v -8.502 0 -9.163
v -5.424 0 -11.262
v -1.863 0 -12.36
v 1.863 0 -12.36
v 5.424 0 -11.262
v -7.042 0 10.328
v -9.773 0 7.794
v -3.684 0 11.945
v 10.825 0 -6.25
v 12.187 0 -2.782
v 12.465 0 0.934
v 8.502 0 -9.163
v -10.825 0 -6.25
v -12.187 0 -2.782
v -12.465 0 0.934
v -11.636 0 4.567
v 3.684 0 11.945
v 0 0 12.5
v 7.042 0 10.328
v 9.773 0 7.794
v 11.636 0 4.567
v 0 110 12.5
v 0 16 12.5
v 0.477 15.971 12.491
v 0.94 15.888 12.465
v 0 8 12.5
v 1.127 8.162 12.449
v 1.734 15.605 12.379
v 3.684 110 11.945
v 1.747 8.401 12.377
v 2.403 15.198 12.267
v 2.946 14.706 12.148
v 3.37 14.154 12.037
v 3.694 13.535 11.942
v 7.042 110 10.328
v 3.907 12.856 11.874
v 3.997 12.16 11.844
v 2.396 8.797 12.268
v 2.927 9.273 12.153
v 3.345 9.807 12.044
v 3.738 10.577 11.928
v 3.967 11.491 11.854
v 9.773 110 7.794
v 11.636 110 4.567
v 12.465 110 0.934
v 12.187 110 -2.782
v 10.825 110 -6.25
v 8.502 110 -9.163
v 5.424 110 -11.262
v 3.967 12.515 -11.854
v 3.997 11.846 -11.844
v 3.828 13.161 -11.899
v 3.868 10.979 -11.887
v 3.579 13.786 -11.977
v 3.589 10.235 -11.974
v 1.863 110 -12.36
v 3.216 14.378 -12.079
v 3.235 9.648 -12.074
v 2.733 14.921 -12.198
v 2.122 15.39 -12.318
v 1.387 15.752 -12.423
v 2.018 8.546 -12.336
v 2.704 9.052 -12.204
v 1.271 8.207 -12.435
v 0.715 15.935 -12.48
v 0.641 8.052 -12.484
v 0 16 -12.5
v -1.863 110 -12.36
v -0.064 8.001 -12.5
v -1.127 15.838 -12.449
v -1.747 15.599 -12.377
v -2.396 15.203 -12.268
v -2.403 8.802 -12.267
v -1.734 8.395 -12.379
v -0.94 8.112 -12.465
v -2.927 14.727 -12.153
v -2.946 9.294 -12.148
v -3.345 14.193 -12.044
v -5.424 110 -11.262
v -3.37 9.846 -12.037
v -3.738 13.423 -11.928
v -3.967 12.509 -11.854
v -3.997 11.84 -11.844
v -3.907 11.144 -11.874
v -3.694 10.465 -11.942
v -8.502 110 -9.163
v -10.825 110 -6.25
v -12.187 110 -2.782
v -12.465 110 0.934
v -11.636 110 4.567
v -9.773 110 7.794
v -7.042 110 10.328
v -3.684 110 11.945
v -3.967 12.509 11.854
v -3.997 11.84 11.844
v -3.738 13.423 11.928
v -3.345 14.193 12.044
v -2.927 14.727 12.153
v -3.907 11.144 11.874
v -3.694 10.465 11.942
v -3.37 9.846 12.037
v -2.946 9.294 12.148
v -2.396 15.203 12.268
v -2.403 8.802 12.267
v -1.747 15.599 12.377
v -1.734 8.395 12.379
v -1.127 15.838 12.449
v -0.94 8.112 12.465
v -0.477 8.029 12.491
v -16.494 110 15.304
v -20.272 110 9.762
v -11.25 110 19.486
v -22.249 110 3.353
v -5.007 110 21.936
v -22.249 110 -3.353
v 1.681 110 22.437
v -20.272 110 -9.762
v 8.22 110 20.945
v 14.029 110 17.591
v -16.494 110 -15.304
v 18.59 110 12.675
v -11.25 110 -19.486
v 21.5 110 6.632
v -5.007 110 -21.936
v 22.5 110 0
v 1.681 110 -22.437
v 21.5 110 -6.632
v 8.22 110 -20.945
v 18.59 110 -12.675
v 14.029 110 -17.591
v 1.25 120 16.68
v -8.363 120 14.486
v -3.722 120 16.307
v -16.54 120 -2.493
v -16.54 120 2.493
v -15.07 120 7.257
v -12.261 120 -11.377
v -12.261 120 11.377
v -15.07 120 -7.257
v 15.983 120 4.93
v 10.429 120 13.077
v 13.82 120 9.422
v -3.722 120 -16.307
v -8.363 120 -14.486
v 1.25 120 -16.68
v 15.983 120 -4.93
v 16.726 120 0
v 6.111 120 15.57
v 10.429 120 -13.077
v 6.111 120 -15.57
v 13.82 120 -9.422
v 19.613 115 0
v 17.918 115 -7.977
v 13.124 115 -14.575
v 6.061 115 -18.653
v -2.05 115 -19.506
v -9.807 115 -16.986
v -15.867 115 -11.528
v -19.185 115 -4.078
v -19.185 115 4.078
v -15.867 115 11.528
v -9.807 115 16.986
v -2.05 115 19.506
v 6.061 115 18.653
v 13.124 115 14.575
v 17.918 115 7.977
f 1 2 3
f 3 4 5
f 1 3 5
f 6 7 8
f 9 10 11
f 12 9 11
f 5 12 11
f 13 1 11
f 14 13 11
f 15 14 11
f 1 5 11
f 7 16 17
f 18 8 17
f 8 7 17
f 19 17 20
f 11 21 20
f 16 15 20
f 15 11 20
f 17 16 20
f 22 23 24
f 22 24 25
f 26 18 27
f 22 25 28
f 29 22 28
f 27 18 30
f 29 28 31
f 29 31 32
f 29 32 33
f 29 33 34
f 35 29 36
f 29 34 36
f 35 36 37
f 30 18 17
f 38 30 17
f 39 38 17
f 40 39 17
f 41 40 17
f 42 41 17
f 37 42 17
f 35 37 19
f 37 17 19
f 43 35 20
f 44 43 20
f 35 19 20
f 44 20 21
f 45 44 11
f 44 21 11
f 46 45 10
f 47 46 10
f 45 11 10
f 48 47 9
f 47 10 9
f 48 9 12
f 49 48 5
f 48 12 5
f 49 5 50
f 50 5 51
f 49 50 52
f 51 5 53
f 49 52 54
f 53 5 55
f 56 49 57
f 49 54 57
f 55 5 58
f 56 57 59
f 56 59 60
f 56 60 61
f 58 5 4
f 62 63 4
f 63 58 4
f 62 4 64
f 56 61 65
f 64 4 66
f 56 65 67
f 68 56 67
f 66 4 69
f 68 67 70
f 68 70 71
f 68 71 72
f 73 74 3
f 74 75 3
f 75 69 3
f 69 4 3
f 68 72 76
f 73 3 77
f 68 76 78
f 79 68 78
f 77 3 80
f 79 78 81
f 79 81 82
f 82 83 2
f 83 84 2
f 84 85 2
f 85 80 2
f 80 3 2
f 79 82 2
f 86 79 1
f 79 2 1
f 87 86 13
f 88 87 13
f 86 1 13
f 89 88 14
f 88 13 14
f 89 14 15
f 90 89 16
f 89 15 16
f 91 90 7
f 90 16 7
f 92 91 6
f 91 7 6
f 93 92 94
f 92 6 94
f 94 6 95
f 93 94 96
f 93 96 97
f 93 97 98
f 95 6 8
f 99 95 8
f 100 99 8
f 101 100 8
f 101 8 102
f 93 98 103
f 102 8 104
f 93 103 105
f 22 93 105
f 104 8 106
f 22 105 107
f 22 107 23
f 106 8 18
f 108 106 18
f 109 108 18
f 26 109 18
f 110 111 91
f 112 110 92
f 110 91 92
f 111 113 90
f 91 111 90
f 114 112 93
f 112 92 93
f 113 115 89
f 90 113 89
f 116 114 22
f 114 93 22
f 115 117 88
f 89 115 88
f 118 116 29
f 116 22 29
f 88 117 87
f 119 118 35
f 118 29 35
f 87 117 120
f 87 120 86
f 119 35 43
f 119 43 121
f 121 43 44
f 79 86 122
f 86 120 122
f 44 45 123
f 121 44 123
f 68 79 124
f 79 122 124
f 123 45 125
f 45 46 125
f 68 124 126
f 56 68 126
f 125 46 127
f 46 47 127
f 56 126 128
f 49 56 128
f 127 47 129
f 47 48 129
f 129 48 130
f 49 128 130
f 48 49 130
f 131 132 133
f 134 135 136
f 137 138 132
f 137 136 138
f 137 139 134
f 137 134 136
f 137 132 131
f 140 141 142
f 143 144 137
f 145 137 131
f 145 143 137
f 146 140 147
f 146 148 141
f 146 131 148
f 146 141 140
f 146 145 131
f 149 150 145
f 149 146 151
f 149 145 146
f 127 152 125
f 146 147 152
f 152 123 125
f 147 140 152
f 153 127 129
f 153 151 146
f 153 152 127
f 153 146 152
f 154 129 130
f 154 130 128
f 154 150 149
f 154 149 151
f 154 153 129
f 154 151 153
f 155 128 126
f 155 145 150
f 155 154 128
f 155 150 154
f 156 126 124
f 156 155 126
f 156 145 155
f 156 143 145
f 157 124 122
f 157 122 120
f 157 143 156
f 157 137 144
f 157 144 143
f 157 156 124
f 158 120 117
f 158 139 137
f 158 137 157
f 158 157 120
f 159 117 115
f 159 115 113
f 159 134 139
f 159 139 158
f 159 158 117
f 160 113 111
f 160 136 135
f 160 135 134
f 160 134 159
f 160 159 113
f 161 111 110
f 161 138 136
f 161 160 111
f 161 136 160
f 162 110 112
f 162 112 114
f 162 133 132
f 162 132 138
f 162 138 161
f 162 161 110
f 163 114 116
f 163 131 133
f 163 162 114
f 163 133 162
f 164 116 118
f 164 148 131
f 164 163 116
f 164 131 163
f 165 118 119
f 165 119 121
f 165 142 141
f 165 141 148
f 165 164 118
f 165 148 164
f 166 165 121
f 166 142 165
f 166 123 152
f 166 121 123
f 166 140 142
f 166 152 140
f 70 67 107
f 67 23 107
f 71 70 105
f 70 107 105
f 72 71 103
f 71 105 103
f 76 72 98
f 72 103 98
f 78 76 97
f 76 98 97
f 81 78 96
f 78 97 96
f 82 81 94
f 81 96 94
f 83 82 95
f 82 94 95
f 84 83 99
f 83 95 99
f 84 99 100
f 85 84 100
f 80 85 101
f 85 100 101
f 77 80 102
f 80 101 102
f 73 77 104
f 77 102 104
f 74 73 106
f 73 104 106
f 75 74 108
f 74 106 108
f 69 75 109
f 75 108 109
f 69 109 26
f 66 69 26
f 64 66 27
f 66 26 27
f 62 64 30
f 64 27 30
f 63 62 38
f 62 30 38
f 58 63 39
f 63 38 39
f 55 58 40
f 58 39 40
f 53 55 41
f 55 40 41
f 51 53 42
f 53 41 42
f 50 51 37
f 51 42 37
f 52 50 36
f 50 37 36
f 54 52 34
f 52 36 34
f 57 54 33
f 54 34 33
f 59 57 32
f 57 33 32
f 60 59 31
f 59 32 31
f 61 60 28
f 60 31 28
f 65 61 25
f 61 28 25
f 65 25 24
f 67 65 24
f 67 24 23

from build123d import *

# Parameters (mm, degrees)
SKETCH1_R           = 12.5
BOSS_EXTRUDE1_DEPTH = 110
SKETCH2_R           = 22.5
BOSS_EXTRUDE2_DEPTH = 10
BOSS_EXTRUDE2_TAPER = 30
SKETCH3_R           = 4
CUT_EXTRUDE1_DEPTH  = 30


with BuildPart() as part:
    # Sketch1 → Boss-Extrude1 (new body)
    with BuildSketch(Plane(origin=(0, 0, 0), x_dir=(1, 0, 0), z_dir=(0, 1, 0))):
        with Locations(Location((0, 0, 0), (0, 0, 270))):
            Circle(SKETCH1_R)
    extrude(amount=BOSS_EXTRUDE1_DEPTH)

    # Sketch2 → Boss-Extrude2 (add)
    with BuildSketch(Plane(origin=(0, 110, 0), x_dir=(1, 0, 0), z_dir=(0, 1, 0))):
        Circle(SKETCH2_R)
    extrude(amount=BOSS_EXTRUDE2_DEPTH, taper=BOSS_EXTRUDE2_TAPER)

    # Sketch3 → Cut-Extrude1 (cut, symmetric)
    with BuildSketch(Plane.XY):
        with Locations(Location((0, 12, 0), (0, 0, 89.99999999))):
            Circle(SKETCH3_R)
    extrude(amount=CUT_EXTRUDE1_DEPTH, both=True, mode=Mode.SUBTRACT)


solid = part.part
